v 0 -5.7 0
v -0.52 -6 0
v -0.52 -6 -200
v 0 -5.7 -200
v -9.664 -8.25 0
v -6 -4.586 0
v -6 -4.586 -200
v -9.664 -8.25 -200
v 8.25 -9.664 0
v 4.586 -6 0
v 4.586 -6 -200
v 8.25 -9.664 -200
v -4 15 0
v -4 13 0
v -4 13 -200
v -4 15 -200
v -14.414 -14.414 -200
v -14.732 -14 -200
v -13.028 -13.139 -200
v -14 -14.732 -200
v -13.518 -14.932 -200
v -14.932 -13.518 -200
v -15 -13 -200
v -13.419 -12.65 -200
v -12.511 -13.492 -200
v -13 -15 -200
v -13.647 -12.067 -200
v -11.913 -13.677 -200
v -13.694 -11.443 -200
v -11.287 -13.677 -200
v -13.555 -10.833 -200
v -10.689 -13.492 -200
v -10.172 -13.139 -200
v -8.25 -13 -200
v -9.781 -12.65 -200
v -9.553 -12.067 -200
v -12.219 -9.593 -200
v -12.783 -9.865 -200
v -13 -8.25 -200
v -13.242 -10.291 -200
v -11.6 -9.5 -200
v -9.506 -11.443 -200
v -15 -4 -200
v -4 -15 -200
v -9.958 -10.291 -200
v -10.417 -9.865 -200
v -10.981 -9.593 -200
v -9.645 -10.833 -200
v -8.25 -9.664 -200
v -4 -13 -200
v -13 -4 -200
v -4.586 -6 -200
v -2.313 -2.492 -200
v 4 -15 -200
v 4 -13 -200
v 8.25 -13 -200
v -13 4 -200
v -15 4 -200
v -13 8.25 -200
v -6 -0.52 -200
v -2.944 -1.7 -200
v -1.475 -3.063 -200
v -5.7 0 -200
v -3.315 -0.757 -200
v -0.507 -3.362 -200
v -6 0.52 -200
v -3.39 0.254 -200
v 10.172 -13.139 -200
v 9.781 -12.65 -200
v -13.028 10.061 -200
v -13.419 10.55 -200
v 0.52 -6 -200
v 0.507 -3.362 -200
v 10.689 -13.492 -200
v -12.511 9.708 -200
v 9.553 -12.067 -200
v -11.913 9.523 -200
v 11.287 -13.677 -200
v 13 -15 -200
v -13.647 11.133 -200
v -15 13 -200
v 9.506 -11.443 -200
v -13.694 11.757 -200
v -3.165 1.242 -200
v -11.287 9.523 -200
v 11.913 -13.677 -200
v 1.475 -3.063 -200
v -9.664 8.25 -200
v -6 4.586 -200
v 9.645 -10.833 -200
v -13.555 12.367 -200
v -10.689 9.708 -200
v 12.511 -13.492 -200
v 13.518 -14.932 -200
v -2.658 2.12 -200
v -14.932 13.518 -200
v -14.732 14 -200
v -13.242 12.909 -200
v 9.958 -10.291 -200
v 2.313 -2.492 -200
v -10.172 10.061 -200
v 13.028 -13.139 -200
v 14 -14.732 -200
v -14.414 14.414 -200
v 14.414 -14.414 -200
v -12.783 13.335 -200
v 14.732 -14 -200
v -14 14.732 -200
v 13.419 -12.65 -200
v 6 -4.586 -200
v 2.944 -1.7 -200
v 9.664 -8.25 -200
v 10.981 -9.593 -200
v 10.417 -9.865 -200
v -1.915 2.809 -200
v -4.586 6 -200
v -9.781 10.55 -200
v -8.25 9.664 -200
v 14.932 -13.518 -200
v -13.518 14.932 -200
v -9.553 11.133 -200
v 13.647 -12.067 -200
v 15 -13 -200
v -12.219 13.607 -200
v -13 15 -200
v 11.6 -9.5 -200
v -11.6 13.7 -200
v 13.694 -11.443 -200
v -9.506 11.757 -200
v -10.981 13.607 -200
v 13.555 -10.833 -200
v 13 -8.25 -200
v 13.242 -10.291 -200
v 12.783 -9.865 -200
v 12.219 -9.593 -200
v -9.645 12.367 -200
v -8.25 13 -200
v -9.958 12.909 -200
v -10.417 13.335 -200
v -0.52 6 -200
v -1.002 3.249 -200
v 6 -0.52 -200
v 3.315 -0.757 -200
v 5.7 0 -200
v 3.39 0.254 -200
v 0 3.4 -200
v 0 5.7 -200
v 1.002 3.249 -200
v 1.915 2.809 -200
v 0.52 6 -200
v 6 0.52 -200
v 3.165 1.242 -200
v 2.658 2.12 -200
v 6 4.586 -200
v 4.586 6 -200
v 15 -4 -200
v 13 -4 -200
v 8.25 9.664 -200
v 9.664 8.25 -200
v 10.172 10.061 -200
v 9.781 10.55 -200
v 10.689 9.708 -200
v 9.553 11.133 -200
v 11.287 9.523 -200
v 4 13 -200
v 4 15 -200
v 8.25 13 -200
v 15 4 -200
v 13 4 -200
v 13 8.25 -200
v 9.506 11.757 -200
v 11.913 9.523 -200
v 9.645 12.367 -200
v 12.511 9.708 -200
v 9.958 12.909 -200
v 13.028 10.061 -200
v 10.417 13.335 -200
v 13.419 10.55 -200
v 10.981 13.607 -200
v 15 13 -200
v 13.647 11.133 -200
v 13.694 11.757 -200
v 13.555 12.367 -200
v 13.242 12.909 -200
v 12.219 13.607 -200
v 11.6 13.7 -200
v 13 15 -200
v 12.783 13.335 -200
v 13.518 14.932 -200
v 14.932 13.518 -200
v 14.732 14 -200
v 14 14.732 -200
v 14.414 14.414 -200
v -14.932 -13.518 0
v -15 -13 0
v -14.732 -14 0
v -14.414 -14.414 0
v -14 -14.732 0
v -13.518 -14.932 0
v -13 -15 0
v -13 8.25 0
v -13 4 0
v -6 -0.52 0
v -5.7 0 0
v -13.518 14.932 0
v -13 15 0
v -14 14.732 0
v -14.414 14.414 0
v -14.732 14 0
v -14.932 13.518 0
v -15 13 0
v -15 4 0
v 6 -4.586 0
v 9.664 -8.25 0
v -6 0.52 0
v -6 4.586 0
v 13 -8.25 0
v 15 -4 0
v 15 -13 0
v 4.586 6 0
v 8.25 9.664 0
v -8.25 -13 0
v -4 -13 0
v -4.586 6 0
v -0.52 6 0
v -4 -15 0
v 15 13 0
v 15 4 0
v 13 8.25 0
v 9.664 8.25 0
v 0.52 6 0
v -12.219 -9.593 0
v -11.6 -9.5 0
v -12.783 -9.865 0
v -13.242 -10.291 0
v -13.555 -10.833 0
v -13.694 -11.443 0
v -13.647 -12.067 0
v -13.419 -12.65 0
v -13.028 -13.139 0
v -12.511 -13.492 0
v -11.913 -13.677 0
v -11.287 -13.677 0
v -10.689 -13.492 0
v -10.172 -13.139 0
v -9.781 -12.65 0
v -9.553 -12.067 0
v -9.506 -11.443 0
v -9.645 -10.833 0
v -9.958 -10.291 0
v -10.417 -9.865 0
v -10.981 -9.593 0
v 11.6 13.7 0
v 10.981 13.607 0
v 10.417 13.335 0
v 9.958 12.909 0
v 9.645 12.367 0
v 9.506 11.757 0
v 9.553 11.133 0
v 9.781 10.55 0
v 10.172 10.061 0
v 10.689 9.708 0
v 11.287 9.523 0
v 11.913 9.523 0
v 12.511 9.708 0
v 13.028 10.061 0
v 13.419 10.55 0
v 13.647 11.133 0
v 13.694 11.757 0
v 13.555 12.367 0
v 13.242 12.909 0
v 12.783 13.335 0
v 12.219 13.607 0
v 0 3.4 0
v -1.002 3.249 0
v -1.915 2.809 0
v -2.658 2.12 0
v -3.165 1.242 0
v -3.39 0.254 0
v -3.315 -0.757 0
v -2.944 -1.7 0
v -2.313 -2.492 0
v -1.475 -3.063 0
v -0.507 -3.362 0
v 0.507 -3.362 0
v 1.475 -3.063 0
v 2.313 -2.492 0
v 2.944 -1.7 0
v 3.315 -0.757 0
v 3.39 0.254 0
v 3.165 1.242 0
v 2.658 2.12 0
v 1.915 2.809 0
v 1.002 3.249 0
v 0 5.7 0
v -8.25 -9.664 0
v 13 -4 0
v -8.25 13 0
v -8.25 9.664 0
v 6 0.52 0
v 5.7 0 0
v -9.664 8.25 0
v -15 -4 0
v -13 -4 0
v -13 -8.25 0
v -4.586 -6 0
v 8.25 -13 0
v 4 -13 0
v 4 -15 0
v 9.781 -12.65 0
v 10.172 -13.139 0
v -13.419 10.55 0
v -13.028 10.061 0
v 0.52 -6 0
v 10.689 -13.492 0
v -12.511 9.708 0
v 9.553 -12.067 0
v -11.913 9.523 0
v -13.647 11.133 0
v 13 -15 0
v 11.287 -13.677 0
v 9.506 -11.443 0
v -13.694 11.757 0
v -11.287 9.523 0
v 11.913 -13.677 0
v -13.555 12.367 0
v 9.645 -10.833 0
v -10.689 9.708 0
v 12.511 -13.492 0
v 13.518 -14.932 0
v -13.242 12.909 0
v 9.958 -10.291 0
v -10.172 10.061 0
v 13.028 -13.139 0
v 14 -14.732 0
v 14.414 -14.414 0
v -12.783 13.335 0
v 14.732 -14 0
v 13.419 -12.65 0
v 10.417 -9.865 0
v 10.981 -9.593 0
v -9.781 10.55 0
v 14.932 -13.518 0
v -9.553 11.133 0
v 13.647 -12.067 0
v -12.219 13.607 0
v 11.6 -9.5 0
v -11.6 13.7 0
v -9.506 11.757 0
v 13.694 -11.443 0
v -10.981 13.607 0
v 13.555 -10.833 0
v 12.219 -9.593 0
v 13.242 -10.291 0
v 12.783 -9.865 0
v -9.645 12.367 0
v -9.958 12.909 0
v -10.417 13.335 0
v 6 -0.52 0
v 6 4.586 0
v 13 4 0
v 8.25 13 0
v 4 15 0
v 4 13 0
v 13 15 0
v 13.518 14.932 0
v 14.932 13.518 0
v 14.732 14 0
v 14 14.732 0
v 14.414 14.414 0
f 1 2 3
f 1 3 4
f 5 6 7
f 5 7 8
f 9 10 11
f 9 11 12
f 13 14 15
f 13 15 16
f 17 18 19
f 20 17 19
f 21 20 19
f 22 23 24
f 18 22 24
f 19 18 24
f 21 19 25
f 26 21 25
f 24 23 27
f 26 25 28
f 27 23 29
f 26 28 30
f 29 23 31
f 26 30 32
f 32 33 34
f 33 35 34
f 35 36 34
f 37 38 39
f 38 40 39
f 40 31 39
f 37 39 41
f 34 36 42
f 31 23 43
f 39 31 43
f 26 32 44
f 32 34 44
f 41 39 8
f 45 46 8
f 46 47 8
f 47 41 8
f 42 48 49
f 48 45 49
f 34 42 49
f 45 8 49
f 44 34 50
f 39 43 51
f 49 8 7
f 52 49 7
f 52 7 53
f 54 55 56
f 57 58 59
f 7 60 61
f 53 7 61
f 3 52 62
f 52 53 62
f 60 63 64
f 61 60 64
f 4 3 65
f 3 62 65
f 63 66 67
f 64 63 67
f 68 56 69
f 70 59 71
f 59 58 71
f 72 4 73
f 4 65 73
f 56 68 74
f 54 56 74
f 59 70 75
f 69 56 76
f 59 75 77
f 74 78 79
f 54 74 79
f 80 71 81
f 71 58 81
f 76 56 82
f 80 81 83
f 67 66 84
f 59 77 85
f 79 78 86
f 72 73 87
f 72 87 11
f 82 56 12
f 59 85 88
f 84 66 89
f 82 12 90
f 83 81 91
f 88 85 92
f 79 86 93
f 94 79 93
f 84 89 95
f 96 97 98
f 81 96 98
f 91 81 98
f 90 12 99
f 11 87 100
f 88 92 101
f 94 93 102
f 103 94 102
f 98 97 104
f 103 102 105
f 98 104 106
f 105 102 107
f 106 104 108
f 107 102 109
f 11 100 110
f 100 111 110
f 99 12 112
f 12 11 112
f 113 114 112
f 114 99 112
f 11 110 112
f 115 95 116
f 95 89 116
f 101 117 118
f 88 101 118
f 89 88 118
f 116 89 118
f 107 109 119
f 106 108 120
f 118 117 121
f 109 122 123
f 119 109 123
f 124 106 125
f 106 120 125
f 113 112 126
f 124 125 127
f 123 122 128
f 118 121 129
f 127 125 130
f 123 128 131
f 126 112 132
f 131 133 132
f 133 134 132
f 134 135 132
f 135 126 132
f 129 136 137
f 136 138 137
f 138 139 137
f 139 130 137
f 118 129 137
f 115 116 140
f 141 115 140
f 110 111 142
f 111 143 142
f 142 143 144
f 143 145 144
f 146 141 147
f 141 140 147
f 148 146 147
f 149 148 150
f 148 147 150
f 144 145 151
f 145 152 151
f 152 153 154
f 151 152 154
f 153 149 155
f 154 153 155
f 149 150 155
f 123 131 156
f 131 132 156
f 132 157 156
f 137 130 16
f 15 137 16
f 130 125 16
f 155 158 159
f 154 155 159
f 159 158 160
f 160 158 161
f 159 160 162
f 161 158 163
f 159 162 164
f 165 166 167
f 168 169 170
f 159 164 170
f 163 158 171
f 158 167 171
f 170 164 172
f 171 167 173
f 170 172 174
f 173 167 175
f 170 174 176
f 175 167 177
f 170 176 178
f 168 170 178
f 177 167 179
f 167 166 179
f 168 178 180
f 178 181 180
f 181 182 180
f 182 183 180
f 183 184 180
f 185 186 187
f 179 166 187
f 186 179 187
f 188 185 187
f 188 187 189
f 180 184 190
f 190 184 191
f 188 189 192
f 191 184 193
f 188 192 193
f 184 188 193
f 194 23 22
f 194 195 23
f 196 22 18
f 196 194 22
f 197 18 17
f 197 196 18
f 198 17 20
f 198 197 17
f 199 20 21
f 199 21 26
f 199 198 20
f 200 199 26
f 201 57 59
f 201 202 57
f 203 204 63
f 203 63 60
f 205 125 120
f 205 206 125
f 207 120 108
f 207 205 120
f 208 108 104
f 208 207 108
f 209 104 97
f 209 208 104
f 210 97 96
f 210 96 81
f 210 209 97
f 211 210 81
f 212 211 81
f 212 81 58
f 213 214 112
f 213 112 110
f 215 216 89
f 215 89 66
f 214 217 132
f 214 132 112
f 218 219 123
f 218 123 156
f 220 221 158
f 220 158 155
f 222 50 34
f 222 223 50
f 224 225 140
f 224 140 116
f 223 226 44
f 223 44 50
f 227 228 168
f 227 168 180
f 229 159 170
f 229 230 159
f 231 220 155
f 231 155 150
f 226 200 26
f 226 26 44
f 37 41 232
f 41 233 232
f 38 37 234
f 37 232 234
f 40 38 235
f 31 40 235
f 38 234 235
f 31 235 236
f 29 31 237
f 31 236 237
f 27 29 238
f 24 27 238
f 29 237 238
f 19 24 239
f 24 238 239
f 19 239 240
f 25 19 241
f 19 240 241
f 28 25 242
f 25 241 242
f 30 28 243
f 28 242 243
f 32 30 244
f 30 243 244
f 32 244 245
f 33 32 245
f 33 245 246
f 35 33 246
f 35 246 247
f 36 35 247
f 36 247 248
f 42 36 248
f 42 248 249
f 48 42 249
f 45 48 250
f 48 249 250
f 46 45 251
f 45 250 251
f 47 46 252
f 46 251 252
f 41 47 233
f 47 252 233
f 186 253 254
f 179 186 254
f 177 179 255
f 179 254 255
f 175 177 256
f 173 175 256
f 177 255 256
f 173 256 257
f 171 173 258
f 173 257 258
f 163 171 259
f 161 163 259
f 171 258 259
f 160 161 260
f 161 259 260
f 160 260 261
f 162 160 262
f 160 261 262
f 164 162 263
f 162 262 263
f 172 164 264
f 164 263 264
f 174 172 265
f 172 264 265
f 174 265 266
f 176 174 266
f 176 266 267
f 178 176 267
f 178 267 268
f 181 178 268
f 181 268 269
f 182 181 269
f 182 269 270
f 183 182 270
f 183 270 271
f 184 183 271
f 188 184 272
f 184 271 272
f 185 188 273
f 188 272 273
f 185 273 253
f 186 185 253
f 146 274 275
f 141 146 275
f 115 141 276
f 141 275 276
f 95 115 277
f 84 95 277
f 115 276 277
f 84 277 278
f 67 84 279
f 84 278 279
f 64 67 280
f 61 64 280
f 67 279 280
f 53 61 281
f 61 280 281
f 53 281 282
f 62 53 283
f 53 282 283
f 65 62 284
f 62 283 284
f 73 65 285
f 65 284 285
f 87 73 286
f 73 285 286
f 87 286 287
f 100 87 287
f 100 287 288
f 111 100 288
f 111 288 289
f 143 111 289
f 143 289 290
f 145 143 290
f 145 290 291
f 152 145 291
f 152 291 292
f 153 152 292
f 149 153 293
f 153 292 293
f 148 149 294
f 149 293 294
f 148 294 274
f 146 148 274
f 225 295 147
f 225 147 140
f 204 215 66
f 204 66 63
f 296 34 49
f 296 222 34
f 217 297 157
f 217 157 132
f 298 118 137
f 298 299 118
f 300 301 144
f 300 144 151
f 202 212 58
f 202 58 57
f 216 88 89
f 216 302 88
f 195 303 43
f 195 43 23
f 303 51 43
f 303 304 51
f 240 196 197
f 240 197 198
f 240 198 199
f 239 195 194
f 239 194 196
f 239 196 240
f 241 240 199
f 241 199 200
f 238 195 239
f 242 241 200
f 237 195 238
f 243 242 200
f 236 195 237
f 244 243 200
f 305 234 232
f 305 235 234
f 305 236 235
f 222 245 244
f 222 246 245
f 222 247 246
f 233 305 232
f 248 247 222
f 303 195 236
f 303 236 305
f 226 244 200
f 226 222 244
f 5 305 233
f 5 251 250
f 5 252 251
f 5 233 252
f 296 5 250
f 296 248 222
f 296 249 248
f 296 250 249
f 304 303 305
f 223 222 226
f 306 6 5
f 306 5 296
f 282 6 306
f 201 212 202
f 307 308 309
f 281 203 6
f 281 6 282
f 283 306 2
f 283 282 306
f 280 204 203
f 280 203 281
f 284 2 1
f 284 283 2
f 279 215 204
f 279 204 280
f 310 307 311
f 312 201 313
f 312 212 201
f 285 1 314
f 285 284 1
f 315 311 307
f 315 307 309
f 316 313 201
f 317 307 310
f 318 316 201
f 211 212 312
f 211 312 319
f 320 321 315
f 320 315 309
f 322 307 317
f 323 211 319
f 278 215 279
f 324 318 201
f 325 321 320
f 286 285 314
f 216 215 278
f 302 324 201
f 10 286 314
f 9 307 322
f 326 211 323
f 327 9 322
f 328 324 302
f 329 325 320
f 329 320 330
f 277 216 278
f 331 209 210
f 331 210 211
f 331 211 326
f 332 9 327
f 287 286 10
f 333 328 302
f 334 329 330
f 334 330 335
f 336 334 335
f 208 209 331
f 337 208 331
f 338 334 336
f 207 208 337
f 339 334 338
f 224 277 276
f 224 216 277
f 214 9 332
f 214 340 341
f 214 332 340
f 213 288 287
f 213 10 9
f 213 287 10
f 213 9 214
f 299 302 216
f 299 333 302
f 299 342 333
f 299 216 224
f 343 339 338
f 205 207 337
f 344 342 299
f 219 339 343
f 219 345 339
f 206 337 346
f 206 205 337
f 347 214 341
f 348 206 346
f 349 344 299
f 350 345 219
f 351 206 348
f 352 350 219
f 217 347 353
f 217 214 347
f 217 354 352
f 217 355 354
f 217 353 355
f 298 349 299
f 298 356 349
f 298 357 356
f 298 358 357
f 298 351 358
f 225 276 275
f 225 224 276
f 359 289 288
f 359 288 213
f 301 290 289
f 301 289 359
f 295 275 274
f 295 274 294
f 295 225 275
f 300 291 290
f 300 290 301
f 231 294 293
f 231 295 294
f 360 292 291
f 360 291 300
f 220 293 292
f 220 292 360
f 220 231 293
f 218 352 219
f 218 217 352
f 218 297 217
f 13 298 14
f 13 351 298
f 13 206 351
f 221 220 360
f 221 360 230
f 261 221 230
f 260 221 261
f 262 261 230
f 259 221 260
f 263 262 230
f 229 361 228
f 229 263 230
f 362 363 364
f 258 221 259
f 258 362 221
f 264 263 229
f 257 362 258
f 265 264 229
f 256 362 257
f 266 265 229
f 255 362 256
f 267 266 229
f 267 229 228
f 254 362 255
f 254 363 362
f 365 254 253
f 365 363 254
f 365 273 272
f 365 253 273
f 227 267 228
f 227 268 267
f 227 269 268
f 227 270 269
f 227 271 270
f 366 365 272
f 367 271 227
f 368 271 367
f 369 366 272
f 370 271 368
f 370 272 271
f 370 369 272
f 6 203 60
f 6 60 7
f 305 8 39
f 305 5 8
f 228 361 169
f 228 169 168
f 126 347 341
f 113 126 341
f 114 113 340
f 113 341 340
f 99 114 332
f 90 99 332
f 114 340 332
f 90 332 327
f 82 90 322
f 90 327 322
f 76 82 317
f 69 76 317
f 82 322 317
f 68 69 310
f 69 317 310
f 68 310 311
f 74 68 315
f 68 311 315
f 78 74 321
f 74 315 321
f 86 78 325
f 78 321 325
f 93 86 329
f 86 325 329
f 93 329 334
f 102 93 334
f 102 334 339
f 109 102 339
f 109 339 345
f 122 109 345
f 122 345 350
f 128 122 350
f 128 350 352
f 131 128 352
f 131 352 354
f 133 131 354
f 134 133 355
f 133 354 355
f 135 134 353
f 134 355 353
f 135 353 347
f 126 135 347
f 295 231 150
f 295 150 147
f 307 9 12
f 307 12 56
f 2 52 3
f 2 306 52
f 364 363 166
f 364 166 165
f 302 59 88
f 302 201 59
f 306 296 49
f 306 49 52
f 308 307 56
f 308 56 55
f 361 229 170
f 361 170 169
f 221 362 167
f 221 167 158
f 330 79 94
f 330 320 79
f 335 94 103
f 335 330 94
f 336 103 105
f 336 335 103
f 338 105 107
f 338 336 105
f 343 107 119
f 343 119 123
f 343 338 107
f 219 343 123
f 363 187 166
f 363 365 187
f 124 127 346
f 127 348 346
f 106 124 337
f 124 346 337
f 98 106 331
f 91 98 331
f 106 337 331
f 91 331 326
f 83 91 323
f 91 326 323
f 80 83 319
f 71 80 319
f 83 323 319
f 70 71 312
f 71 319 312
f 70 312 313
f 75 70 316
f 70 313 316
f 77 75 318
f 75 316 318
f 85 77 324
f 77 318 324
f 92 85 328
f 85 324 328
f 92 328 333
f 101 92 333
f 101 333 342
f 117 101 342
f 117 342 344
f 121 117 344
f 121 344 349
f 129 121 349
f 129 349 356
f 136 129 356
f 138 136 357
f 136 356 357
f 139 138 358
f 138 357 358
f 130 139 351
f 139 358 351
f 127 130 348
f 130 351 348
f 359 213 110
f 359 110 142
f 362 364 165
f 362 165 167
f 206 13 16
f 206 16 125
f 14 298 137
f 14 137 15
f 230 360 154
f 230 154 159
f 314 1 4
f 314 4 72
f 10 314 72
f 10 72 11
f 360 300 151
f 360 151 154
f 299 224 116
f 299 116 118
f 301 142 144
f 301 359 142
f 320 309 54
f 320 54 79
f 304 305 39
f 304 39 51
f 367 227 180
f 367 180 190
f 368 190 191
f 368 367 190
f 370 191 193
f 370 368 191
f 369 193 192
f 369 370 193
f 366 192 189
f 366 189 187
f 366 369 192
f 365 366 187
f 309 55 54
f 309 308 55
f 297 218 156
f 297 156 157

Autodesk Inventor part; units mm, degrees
sketch "Sketch_1" plane through (0, 0, 0) normal (0, 0, 1) x (1, 0, 0)
  line L0 (-15, 4) -> (-13, 4)
  line L1 (-13, 4) -> (-13, 8.25)
  line L2 (-13, 8.25) -> (-9.6642, 8.25)
  line L3 (-9.6642, 8.25) -> (-6, 4.5858)
  line L4 (-6, 4.5858) -> (-6, 0.5196)
  line L5 (-6, 0.5196) -> (-5.7, 0)
  line L6 (-5.7, 0) -> (-6, -0.5196)
  line L7 (-6, -0.5196) -> (-6, -4.5858)
  line L8 (-6, -4.5858) -> (-9.6642, -8.25)
  line L9 (-9.6642, -8.25) -> (-13, -8.25)
  line L10 (-13, -8.25) -> (-13, -4)
  line L11 (-13, -4) -> (-15, -4)
  line L12 (-15, -4) -> (-15, -13)
  arc A0 (-15, -13) -> (-13, -15) centre (-13, -13) ccw
  line L13 (-13, -15) -> (-4, -15)
  line L14 (-4, -15) -> (-4, -13)
  line L15 (-4, -13) -> (-8.25, -13)
  line L16 (-8.25, -13) -> (-8.25, -9.6642)
  line L17 (-8.25, -9.6642) -> (-4.5858, -6)
  line L18 (-4.5858, -6) -> (-0.5196, -6)
  line L19 (-0.5196, -6) -> (0, -5.7)
  line L20 (0, -5.7) -> (0.5196, -6)
  line L21 (0.5196, -6) -> (4.5858, -6)
  line L22 (4.5858, -6) -> (8.25, -9.6642)
  line L23 (8.25, -9.6642) -> (8.25, -13)
  line L24 (8.25, -13) -> (4, -13)
  line L25 (4, -13) -> (4, -15)
  line L26 (4, -15) -> (13, -15)
  arc A1 (13, -15) -> (15, -13) centre (13, -13) ccw
  line L27 (15, -13) -> (15, -4)
  line L28 (15, -4) -> (13, -4)
  line L29 (13, -4) -> (13, -8.25)
  line L30 (13, -8.25) -> (9.6642, -8.25)
  line L31 (9.6642, -8.25) -> (6, -4.5858)
  line L32 (6, -4.5858) -> (6, -0.5196)
  line L33 (6, -0.5196) -> (5.7, 0)
  line L34 (5.7, 0) -> (6, 0.5196)
  line L35 (6, 0.5196) -> (6, 4.5858)
  line L36 (6, 4.5858) -> (9.6642, 8.25)
  line L37 (9.6642, 8.25) -> (13, 8.25)
  line L38 (13, 8.25) -> (13, 4)
  line L39 (13, 4) -> (15, 4)
  line L40 (15, 4) -> (15, 13)
  arc A2 (15, 13) -> (13, 15) centre (13, 13) ccw
  line L41 (13, 15) -> (4, 15)
  line L42 (4, 15) -> (4, 13)
  line L43 (4, 13) -> (8.25, 13)
  line L44 (8.25, 13) -> (8.25, 9.6642)
  line L45 (8.25, 9.6642) -> (4.5858, 6)
  line L46 (4.5858, 6) -> (0.5196, 6)
  line L47 (0.5196, 6) -> (0, 5.7)
  line L48 (0, 5.7) -> (-0.5196, 6)
  line L49 (-0.5196, 6) -> (-4.5858, 6)
  line L50 (-4.5858, 6) -> (-8.25, 9.6642)
  line L51 (-8.25, 9.6642) -> (-8.25, 13)
  line L52 (-8.25, 13) -> (-4, 13)
  line L53 (-4, 13) -> (-4, 15)
  line L54 (-4, 15) -> (-13, 15)
  arc A3 (-13, 15) -> (-15, 13) centre (-13, 13) ccw
  line L55 (-15, 13) -> (-15, 4)
extrude "Extrusion1" add sketch "Sketch_1" against normal blind 200
sketch "Sketch2" plane through (0, 0, -200) normal (0, 0, -1) x (-1, 0, 0)
  point P0 (0, 0)
hole "Hole1" at (0, 0, -200) direction (0, 0, 1) diameter 6.8 depth 200
sketch "Sketch3" plane through (0, 0, -200) normal (0, 0, -1) x (-1, 0, 0)
  point P0 (-11.6, 11.6)
hole "Hole2" at (11.6, 11.6, -200) direction (0, 0, 1) diameter 4.2 depth 200
pattern_linear "Rectangular Pattern1" count 2 spacing 23.2 along (-1, 0, 0) count 2 spacing 23.2 along (0, -1, 0) of "Hole2"
ref_plane "C1_XY" through (0, 0, 0) normal (0, 0, 1) x (1, 0, 0)
ref_plane "C1_YZ" through (0, 0, 0) normal (1, 0, 0) x (0, 1, 0)
ref_plane "C1_ZX" through (0, 0, 0) normal (0, 1, 0) x (0, 0, 1)
ref_plane "to_frame_cap1_XY" through (0, 0, 0) normal (0, 0, 1) x (1, 0, 0)
ref_plane "to_frame_cap1_YZ" through (0, 0, 0) normal (1, 0, 0) x (0, 1, 0)
ref_plane "to_frame_cap1_ZX" through (0, 0, 0) normal (0, 1, 0) x (0, 0, 1)
ref_plane "to_frame_cap2_XY" through (0, 0, -200) normal (0, 0, -1) x (1, 0, 0)
ref_plane "to_frame_cap2_YZ" through (0, 0, -200) normal (1, 0, 0) x (0, -1, 0)
ref_plane "to_frame_cap2_ZX" through (0, 0, -200) normal (0, -1, 0) x (0, 0, -1)
properties part number "HFS6-3030-200"
